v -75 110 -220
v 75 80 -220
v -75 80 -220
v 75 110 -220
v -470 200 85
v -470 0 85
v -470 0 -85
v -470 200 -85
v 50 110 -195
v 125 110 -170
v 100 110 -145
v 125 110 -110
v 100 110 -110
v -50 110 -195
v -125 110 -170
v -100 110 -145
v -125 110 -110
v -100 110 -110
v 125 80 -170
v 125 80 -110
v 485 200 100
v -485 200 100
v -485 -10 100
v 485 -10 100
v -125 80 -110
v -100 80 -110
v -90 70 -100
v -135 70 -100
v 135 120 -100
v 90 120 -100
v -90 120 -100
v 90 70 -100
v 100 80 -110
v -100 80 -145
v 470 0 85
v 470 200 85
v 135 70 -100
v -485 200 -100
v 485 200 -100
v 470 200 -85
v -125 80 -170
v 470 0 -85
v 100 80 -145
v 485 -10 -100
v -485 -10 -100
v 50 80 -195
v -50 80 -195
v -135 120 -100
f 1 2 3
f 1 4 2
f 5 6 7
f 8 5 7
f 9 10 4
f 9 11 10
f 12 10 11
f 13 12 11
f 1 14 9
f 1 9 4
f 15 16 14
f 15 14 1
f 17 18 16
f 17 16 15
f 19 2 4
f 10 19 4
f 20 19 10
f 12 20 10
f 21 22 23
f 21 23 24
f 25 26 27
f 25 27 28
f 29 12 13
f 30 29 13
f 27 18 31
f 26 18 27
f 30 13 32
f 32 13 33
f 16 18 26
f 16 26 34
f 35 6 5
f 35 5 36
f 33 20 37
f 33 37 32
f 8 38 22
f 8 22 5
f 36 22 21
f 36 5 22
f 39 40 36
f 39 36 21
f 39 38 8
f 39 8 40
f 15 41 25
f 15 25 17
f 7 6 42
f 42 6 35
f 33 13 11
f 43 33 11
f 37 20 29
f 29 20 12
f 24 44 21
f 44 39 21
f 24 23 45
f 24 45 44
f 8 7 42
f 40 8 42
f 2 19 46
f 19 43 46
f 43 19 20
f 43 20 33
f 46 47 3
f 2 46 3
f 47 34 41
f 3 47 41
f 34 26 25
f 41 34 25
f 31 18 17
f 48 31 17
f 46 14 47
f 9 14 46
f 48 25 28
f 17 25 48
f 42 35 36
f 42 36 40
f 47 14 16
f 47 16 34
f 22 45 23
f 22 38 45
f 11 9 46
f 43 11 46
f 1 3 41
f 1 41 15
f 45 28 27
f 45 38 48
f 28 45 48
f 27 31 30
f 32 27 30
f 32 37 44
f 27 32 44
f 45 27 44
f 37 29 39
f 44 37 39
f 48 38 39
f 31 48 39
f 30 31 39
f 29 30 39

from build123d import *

# Parameters (mm, degrees)
SKETCH_1_W          = 970
SKETCH_1_H          = 200
SKETCH_1_W_2        = 940
SKETCH_1_H_2        = 170
EXTRUDE_1_DEPTH     = 200
SKETCH_2_W          = 970
SKETCH_2_H          = 200
EXTRUDE_2_DEPTH     = 10
SKETCH_3_W          = 250
SKETCH_3_H          = 30
EXTRUDE_3_DEPTH     = 120
SKETCH_4_W          = 200
SKETCH_4_H          = 95
CUT_EXTRUDE_1_DEPTH = 120
CHAMFER_1_SIZE      = 10
CHAMFER_2_SIZE      = 50


with BuildPart() as part:
    # 草图1 → 凸台-拉伸1 (new body)
    with BuildSketch(Plane(origin=(0, 0, 0), x_dir=(1, 0, 0), z_dir=(0, 1, 0))):
        Rectangle(SKETCH_1_W, SKETCH_1_H)
        Rectangle(SKETCH_1_W_2, SKETCH_1_H_2, mode=Mode.SUBTRACT)
    extrude(amount=EXTRUDE_1_DEPTH)

    # 草图2 → 凸台-拉伸2 (add)
    with BuildSketch(Plane.XZ):
        Rectangle(SKETCH_2_W, SKETCH_2_H)
    extrude(amount=EXTRUDE_2_DEPTH)

    # 草图3 → 凸台-拉伸3 (add)
    with BuildSketch(Plane(origin=(0, 0, -100), x_dir=(-1, 0, 0), z_dir=(0, 0, -1))):
        with Locations((0, 95)):
            Rectangle(SKETCH_3_W, SKETCH_3_H)
    extrude(amount=EXTRUDE_3_DEPTH)

    # 草图4 → 切除-拉伸1 (cut)
    with BuildSketch(Plane(origin=(0, 110, 0), x_dir=(1, 0, 0), z_dir=(0, 1, 0))):
        with Locations((0, 147.5)):
            Rectangle(SKETCH_4_W, SKETCH_4_H)
    extrude(amount=-CUT_EXTRUDE_1_DEPTH, mode=Mode.SUBTRACT)

    # 倒角1
    chamfer_1_edges = [part.edges().sort_by_distance(p)[0] for p in [
        (-125, 95, -100),
        (-112.5, 110, -100),
        (125, 95, -100),
        (112.5, 80, -100),
        (-112.5, 80, -100),
        (112.5, 110, -100),
        (-100, 95, -100),
        (100, 95, -100),
    ]]
    chamfer(chamfer_1_edges, length=CHAMFER_1_SIZE)

    # 倒角2
    chamfer_2_edges = [part.edges().sort_by_distance(p)[0] for p in [
        (-125, 95, -220),
        (125, 95, -220),
        (-100, 95, -195),
        (100, 95, -195),
    ]]
    chamfer(chamfer_2_edges, length=CHAMFER_2_SIZE)


solid = part.part
